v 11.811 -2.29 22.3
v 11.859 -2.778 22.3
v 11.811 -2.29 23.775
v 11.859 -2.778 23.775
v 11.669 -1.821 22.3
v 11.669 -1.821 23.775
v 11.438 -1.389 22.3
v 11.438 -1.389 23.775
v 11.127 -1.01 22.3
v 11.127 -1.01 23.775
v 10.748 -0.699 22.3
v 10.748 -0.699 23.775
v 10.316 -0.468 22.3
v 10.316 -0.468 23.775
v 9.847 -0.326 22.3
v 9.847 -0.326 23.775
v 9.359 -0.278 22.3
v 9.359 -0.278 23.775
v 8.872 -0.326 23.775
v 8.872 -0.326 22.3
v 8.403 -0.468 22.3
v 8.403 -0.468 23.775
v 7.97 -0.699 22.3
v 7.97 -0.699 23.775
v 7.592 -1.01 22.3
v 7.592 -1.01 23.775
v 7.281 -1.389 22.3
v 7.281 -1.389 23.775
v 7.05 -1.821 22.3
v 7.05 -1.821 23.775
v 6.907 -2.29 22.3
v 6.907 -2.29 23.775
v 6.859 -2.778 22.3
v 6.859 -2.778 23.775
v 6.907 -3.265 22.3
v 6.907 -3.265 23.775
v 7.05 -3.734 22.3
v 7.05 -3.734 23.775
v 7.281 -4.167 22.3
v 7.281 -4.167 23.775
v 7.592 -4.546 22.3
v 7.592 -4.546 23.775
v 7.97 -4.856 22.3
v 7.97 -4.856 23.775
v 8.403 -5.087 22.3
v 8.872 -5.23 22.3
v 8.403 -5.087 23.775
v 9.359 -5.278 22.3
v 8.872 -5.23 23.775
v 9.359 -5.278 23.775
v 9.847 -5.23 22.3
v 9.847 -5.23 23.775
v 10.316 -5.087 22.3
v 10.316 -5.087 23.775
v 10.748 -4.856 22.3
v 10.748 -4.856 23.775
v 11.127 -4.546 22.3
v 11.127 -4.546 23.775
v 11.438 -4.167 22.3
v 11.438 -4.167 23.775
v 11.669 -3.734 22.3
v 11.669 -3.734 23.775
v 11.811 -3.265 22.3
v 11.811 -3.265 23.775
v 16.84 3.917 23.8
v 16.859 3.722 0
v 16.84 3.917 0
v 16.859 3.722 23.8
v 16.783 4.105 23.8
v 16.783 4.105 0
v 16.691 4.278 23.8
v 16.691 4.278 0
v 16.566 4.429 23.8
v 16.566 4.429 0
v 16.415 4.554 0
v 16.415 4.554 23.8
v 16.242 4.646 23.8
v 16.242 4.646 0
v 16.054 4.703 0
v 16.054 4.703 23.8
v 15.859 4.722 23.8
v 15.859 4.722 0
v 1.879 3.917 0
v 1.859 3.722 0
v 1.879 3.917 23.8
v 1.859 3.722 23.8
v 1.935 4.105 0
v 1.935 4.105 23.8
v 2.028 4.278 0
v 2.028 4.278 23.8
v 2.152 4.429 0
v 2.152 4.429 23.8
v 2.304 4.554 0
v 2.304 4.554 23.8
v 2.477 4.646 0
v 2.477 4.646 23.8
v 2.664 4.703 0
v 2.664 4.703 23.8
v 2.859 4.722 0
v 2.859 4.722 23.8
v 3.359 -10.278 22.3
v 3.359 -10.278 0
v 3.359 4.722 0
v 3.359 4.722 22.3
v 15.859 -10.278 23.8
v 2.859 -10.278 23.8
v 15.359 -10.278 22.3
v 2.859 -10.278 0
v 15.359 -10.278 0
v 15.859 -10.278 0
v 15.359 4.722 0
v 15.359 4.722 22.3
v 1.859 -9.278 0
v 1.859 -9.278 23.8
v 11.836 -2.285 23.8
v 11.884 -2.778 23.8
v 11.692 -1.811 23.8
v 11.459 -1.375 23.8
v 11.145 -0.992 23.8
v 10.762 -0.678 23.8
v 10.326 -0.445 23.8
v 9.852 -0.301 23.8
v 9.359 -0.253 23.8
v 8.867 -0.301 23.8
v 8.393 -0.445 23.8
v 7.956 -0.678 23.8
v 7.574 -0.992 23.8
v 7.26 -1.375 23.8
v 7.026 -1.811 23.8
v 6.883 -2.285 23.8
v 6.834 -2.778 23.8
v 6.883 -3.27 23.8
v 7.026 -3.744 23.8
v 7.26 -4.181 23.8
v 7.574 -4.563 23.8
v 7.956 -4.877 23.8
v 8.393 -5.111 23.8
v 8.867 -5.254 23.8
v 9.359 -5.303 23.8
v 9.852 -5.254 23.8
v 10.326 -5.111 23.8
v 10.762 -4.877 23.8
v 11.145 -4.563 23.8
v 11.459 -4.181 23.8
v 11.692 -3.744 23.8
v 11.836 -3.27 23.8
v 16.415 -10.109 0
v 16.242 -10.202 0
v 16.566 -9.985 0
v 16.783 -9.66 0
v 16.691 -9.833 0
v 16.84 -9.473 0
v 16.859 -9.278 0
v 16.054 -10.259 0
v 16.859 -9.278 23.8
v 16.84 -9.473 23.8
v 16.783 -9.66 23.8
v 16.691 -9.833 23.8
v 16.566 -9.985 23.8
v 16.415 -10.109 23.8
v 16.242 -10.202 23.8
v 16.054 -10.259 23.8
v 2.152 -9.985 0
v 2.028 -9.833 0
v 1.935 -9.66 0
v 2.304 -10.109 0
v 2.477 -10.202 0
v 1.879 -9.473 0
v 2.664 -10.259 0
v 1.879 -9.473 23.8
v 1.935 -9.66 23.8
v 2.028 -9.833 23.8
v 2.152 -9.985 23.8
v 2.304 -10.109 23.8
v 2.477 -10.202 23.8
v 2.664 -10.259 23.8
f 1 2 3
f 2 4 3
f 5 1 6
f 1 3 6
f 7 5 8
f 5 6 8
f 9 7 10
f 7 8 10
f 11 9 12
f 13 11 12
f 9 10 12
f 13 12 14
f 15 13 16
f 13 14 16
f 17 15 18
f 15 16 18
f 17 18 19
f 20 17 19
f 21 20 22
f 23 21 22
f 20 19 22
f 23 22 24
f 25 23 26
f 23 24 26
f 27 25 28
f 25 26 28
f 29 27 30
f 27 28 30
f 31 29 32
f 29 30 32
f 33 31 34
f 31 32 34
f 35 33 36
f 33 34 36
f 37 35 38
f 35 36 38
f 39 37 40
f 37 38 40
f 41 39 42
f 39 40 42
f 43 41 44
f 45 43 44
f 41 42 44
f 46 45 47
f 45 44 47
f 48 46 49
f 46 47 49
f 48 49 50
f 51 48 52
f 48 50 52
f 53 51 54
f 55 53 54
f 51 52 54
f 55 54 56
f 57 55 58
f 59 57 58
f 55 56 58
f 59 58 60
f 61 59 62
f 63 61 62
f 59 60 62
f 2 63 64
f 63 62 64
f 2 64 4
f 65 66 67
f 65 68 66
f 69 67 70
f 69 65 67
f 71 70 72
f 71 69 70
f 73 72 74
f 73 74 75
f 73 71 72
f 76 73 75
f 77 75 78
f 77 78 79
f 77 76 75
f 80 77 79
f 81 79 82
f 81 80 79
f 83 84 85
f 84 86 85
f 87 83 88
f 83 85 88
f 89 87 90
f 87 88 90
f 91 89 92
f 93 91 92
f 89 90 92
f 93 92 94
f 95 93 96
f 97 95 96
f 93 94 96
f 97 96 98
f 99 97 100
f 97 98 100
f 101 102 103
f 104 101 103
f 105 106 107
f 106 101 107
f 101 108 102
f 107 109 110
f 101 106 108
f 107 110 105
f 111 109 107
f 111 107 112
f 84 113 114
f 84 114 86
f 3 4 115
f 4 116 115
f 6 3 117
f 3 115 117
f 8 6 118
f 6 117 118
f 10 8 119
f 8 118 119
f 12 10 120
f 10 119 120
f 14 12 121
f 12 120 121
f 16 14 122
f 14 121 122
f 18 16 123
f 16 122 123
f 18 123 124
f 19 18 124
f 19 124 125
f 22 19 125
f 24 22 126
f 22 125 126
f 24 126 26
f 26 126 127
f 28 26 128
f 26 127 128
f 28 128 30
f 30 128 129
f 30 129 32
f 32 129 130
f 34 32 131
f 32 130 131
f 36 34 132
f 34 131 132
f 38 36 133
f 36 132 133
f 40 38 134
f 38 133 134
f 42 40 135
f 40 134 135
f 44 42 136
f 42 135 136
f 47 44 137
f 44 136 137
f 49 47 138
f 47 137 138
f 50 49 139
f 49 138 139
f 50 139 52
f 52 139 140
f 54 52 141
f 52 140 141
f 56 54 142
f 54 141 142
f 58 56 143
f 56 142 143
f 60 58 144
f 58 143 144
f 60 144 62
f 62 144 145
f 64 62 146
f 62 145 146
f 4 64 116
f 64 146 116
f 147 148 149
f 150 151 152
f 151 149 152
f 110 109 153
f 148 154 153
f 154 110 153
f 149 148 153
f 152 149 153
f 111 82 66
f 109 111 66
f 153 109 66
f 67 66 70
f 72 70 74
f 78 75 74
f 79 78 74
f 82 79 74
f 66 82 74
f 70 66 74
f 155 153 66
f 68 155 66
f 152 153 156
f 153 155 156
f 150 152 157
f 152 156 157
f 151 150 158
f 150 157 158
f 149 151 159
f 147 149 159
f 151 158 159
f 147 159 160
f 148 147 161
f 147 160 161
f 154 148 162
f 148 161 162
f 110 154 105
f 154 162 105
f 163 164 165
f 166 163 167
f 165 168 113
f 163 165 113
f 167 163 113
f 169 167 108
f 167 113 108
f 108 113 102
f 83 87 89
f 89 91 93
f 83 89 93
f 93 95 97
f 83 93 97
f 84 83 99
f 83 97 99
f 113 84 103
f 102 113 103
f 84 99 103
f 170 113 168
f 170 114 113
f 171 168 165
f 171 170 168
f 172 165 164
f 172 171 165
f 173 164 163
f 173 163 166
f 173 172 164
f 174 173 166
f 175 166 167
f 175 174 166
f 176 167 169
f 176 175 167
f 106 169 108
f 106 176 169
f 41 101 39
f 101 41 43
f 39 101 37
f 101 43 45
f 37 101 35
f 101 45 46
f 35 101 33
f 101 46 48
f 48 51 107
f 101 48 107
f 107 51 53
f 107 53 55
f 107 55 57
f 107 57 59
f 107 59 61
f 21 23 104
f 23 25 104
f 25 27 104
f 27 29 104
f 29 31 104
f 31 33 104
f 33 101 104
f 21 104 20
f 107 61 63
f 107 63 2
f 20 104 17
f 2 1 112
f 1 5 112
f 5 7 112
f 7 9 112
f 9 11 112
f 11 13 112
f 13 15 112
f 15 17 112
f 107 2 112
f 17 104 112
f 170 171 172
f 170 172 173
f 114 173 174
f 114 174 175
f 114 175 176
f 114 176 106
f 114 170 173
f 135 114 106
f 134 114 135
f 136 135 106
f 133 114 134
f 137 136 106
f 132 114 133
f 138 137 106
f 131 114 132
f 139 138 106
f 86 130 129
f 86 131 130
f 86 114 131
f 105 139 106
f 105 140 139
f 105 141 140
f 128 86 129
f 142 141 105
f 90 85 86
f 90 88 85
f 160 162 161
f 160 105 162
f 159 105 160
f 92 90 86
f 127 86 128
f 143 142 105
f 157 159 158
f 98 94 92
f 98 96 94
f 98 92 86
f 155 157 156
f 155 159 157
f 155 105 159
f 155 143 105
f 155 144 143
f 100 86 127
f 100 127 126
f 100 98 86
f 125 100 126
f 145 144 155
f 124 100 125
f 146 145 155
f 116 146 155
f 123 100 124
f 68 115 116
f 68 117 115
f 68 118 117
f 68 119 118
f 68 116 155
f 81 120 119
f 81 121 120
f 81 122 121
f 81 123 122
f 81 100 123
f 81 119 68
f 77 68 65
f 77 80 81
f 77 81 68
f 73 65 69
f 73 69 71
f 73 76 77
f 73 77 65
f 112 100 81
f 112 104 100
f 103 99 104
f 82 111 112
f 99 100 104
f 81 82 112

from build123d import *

# Parameters (mm, degrees)
SZKIC1_W                    = 15
SZKIC1_H                    = 15
DODANIE_WYCI_GNI_CIE2_DEPTH = 23.8
SKORUPA3_T                  = -1.5
ZAOKR_GLENIE1_R             = 1


# Read off the part's stored shape, not the designer's step: Pogłębienie walcowe pod M2 Śrubę z łbem stożkowym ściętym1
with BuildPart() as part:
    # Szkic1 → Dodanie-wyciągnięcie2 (new body)
    with BuildSketch(Plane.XY):
        with Locations((9.359290026, -2.777742542)):
            Rectangle(SZKIC1_W, SZKIC1_H)
    extrude(amount=DODANIE_WYCI_GNI_CIE2_DEPTH)

    # Skorupa3
    skorupa3_openings = [part.faces().sort_by_distance(p)[0] for p in [
        (9.359290026, -2.777742542, 0),
        (9.359290026, -10.277742542, 11.9),
        (9.359290026, 4.722257458, 11.9),
    ]]
    offset(amount=SKORUPA3_T, openings=skorupa3_openings, kind=Kind.INTERSECTION)

    # Zaokrąglenie1
    zaokr_glenie1_edges = [part.edges().sort_by_distance(p)[0] for p in [
        (16.859290026, -10.277742542, 11.9),
        (1.859290026, -10.277742542, 11.9),
        (1.859290026, 4.722257458, 11.9),
        (16.859290026, 4.722257458, 11.9),
    ]]
    fillet(zaokr_glenie1_edges, radius=ZAOKR_GLENIE1_R)

    # Pog_bienie walcowe pod M2 _rub_ z _b 2 → Pogłębienie walcowe pod M2 Śrubę z łbem stożkowym ściętym1 (revolve, cut)
    with BuildSketch(Plane(origin=(9.359290026, -2.777742542, 0), x_dir=(1, 0, 0), z_dir=(0, -1, 0))):
        Polygon((2.525, 23.8), (0, 23.8), (0, 22.3), (2.5, 22.3), (2.5, 23.775), align=None)
    revolve(axis=Axis((9.359290026, -2.777742542, 0), (0, 0, 1)), mode=Mode.SUBTRACT)


solid = part.part
